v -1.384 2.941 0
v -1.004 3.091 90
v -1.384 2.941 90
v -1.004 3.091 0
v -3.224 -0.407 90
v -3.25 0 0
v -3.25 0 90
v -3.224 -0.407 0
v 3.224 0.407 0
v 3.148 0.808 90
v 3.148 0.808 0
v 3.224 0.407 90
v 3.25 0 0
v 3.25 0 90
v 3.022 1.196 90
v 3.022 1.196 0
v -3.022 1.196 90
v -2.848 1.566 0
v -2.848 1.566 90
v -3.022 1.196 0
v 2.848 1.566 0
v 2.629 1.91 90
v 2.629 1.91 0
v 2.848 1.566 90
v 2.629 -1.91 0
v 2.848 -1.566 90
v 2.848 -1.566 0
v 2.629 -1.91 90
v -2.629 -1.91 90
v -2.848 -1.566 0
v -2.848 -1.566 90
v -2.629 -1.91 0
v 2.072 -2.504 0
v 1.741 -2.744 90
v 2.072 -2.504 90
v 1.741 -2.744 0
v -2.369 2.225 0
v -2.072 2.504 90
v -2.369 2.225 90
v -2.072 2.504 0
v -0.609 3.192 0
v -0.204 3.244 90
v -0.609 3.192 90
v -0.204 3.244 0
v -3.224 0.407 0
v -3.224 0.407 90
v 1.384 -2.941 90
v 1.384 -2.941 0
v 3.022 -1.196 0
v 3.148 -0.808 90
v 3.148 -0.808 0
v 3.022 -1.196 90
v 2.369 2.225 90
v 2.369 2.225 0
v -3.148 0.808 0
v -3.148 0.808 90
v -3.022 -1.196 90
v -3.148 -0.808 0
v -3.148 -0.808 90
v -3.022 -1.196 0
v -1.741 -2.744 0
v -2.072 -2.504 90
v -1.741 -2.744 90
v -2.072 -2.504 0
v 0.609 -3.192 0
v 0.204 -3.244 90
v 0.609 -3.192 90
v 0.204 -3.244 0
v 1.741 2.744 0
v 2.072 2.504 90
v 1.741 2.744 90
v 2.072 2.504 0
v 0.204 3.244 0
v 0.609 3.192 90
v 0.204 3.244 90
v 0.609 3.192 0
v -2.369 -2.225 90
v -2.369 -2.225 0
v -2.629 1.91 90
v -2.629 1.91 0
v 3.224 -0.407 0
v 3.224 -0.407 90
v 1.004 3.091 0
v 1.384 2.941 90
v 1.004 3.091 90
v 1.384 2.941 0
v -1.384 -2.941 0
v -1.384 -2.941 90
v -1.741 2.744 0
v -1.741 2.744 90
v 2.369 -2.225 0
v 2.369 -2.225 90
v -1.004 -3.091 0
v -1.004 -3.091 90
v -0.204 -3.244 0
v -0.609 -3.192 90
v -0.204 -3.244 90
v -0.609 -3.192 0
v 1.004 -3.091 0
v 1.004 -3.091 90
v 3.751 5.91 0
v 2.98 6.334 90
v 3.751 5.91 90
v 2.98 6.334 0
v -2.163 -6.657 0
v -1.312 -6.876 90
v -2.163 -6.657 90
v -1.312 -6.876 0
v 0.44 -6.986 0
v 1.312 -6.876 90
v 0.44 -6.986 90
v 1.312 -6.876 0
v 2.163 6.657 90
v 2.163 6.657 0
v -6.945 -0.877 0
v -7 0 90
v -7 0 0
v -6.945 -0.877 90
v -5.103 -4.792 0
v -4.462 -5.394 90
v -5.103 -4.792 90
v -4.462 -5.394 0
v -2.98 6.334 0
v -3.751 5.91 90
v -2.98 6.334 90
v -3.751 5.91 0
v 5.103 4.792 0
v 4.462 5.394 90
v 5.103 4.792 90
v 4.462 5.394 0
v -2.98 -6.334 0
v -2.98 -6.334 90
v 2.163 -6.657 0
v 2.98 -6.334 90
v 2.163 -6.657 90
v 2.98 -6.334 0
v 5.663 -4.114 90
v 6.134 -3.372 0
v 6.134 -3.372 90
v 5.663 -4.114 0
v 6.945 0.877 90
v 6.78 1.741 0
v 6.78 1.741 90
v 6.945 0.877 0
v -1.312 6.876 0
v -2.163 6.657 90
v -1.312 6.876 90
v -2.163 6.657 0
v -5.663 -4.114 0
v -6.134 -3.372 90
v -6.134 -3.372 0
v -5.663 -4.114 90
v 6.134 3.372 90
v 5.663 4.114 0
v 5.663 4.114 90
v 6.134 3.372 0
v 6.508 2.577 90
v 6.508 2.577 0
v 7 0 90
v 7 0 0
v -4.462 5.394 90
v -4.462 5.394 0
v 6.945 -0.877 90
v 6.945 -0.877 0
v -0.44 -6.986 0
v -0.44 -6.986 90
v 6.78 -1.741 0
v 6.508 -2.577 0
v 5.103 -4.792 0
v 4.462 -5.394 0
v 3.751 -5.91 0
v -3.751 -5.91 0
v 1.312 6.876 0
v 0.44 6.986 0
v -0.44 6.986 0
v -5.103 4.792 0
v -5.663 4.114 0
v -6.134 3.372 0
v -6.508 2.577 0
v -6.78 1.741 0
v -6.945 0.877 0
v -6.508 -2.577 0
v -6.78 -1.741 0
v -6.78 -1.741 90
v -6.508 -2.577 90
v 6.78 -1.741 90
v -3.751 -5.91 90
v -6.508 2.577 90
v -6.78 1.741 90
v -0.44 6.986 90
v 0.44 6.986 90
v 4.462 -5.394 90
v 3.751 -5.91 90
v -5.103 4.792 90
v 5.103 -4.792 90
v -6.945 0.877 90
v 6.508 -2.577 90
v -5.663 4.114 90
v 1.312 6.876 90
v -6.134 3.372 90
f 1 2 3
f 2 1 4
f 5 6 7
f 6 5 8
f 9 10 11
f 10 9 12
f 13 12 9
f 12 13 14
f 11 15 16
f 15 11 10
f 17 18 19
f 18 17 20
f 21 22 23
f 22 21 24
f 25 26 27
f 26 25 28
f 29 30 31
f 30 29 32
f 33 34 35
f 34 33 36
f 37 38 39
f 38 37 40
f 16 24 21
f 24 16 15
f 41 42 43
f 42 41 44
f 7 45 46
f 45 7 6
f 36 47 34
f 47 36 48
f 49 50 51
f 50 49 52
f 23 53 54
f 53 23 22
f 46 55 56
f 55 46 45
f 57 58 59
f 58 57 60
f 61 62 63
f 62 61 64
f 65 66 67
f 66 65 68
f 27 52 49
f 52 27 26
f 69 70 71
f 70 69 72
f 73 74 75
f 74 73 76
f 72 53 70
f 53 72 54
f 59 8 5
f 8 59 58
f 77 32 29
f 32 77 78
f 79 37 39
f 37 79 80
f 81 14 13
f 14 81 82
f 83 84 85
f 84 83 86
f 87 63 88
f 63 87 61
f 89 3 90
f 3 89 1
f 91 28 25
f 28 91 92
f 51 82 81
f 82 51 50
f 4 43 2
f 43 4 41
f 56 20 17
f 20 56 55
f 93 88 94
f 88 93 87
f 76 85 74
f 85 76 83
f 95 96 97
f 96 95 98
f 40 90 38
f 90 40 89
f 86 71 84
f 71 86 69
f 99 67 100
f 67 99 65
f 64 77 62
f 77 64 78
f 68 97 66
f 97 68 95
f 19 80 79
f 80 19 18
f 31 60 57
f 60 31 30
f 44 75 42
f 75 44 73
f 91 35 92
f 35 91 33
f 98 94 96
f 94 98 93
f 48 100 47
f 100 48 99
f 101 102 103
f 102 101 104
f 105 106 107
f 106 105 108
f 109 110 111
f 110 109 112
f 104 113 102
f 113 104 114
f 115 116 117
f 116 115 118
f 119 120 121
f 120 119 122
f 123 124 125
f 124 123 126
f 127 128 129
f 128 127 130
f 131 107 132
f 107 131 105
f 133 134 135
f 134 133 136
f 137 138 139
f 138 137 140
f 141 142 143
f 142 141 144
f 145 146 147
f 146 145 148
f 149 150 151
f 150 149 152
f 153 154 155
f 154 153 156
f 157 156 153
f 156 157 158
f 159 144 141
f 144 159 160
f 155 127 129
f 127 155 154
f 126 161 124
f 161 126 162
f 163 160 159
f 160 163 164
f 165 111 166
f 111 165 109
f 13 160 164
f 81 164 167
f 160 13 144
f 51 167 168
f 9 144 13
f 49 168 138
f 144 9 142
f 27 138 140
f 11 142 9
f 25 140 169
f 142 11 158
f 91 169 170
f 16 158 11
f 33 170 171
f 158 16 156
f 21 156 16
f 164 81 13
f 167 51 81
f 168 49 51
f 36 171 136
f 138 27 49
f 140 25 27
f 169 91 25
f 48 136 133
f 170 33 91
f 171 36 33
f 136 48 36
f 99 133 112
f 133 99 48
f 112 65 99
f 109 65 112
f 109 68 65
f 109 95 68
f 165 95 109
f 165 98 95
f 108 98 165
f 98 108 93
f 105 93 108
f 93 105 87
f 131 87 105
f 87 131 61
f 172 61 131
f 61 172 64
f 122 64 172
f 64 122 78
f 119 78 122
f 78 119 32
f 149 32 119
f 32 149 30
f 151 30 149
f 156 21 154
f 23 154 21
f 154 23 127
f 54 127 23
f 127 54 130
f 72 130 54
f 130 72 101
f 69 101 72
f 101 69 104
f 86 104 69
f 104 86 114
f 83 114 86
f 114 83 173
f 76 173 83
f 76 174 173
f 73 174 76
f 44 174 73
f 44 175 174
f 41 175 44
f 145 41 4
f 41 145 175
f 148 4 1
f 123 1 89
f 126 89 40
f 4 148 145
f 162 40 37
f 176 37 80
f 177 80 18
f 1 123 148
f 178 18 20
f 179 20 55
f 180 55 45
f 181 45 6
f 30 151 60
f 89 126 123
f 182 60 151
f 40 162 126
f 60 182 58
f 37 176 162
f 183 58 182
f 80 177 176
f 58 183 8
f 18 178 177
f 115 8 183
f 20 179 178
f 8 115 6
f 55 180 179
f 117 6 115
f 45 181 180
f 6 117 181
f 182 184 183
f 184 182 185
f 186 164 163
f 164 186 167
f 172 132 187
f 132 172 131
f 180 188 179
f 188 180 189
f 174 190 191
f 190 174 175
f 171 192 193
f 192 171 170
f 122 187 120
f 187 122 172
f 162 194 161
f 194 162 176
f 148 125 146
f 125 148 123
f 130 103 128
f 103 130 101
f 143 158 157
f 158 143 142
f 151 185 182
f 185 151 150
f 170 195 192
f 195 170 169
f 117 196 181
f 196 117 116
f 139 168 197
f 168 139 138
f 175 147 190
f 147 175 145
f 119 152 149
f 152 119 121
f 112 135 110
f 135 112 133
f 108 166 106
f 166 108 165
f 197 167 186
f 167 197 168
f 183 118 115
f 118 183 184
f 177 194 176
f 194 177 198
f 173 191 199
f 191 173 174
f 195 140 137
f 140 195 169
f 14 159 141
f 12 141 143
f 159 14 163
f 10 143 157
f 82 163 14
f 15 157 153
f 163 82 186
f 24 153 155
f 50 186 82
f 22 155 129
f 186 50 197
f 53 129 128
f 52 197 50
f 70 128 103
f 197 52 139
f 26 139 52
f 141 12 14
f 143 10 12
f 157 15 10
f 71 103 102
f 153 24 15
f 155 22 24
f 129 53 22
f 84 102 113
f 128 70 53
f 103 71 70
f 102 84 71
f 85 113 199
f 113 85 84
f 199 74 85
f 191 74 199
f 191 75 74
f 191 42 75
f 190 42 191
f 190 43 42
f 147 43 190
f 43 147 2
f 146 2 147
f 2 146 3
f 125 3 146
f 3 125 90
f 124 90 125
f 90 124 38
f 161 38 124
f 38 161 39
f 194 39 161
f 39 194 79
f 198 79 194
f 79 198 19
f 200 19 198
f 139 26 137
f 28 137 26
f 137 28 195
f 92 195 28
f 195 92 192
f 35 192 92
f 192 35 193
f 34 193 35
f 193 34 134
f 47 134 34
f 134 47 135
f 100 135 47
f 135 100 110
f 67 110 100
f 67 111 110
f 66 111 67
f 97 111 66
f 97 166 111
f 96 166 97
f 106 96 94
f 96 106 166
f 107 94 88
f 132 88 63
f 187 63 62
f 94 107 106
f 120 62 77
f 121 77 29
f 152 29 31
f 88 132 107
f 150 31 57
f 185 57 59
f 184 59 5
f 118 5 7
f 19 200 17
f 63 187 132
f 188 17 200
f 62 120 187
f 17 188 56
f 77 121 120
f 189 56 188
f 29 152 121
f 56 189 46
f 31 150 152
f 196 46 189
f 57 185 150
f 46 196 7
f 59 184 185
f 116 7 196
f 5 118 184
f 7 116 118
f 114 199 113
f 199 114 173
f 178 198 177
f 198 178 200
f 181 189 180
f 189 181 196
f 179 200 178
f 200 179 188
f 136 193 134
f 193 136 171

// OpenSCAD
$fn = 50;


difference() {
	union() {
		*color(alpha = 1.0000000000, c = "gray") {
			translate(v = [0, 7, 0]) {
				linear_extrude(height = 1) {
					text(font = "Arial:style=Bold", halign = "center", size = 4.5000000000, text = "COMMENT plate main", valign = "center");
				}
			}
		}
		cylinder(h = 90, r = 7.0000000000);
	}
	union() {
		*color(alpha = 1.0000000000, c = "gray") {
			translate(v = [0, 7, 0]) {
				linear_extrude(height = 1) {
					text(font = "Arial:style=Bold", halign = "center", size = 4.5000000000, text = "COMMENT holes main", valign = "center");
				}
			}
		}
		translate(v = [0, 0, -100]) {
			cylinder(h = 200, r = 3.2500000000);
		}
		translate(v = [0, 0, -100]) {
			cylinder(h = 200, r = 1.8000000000);
		}
	}
}
